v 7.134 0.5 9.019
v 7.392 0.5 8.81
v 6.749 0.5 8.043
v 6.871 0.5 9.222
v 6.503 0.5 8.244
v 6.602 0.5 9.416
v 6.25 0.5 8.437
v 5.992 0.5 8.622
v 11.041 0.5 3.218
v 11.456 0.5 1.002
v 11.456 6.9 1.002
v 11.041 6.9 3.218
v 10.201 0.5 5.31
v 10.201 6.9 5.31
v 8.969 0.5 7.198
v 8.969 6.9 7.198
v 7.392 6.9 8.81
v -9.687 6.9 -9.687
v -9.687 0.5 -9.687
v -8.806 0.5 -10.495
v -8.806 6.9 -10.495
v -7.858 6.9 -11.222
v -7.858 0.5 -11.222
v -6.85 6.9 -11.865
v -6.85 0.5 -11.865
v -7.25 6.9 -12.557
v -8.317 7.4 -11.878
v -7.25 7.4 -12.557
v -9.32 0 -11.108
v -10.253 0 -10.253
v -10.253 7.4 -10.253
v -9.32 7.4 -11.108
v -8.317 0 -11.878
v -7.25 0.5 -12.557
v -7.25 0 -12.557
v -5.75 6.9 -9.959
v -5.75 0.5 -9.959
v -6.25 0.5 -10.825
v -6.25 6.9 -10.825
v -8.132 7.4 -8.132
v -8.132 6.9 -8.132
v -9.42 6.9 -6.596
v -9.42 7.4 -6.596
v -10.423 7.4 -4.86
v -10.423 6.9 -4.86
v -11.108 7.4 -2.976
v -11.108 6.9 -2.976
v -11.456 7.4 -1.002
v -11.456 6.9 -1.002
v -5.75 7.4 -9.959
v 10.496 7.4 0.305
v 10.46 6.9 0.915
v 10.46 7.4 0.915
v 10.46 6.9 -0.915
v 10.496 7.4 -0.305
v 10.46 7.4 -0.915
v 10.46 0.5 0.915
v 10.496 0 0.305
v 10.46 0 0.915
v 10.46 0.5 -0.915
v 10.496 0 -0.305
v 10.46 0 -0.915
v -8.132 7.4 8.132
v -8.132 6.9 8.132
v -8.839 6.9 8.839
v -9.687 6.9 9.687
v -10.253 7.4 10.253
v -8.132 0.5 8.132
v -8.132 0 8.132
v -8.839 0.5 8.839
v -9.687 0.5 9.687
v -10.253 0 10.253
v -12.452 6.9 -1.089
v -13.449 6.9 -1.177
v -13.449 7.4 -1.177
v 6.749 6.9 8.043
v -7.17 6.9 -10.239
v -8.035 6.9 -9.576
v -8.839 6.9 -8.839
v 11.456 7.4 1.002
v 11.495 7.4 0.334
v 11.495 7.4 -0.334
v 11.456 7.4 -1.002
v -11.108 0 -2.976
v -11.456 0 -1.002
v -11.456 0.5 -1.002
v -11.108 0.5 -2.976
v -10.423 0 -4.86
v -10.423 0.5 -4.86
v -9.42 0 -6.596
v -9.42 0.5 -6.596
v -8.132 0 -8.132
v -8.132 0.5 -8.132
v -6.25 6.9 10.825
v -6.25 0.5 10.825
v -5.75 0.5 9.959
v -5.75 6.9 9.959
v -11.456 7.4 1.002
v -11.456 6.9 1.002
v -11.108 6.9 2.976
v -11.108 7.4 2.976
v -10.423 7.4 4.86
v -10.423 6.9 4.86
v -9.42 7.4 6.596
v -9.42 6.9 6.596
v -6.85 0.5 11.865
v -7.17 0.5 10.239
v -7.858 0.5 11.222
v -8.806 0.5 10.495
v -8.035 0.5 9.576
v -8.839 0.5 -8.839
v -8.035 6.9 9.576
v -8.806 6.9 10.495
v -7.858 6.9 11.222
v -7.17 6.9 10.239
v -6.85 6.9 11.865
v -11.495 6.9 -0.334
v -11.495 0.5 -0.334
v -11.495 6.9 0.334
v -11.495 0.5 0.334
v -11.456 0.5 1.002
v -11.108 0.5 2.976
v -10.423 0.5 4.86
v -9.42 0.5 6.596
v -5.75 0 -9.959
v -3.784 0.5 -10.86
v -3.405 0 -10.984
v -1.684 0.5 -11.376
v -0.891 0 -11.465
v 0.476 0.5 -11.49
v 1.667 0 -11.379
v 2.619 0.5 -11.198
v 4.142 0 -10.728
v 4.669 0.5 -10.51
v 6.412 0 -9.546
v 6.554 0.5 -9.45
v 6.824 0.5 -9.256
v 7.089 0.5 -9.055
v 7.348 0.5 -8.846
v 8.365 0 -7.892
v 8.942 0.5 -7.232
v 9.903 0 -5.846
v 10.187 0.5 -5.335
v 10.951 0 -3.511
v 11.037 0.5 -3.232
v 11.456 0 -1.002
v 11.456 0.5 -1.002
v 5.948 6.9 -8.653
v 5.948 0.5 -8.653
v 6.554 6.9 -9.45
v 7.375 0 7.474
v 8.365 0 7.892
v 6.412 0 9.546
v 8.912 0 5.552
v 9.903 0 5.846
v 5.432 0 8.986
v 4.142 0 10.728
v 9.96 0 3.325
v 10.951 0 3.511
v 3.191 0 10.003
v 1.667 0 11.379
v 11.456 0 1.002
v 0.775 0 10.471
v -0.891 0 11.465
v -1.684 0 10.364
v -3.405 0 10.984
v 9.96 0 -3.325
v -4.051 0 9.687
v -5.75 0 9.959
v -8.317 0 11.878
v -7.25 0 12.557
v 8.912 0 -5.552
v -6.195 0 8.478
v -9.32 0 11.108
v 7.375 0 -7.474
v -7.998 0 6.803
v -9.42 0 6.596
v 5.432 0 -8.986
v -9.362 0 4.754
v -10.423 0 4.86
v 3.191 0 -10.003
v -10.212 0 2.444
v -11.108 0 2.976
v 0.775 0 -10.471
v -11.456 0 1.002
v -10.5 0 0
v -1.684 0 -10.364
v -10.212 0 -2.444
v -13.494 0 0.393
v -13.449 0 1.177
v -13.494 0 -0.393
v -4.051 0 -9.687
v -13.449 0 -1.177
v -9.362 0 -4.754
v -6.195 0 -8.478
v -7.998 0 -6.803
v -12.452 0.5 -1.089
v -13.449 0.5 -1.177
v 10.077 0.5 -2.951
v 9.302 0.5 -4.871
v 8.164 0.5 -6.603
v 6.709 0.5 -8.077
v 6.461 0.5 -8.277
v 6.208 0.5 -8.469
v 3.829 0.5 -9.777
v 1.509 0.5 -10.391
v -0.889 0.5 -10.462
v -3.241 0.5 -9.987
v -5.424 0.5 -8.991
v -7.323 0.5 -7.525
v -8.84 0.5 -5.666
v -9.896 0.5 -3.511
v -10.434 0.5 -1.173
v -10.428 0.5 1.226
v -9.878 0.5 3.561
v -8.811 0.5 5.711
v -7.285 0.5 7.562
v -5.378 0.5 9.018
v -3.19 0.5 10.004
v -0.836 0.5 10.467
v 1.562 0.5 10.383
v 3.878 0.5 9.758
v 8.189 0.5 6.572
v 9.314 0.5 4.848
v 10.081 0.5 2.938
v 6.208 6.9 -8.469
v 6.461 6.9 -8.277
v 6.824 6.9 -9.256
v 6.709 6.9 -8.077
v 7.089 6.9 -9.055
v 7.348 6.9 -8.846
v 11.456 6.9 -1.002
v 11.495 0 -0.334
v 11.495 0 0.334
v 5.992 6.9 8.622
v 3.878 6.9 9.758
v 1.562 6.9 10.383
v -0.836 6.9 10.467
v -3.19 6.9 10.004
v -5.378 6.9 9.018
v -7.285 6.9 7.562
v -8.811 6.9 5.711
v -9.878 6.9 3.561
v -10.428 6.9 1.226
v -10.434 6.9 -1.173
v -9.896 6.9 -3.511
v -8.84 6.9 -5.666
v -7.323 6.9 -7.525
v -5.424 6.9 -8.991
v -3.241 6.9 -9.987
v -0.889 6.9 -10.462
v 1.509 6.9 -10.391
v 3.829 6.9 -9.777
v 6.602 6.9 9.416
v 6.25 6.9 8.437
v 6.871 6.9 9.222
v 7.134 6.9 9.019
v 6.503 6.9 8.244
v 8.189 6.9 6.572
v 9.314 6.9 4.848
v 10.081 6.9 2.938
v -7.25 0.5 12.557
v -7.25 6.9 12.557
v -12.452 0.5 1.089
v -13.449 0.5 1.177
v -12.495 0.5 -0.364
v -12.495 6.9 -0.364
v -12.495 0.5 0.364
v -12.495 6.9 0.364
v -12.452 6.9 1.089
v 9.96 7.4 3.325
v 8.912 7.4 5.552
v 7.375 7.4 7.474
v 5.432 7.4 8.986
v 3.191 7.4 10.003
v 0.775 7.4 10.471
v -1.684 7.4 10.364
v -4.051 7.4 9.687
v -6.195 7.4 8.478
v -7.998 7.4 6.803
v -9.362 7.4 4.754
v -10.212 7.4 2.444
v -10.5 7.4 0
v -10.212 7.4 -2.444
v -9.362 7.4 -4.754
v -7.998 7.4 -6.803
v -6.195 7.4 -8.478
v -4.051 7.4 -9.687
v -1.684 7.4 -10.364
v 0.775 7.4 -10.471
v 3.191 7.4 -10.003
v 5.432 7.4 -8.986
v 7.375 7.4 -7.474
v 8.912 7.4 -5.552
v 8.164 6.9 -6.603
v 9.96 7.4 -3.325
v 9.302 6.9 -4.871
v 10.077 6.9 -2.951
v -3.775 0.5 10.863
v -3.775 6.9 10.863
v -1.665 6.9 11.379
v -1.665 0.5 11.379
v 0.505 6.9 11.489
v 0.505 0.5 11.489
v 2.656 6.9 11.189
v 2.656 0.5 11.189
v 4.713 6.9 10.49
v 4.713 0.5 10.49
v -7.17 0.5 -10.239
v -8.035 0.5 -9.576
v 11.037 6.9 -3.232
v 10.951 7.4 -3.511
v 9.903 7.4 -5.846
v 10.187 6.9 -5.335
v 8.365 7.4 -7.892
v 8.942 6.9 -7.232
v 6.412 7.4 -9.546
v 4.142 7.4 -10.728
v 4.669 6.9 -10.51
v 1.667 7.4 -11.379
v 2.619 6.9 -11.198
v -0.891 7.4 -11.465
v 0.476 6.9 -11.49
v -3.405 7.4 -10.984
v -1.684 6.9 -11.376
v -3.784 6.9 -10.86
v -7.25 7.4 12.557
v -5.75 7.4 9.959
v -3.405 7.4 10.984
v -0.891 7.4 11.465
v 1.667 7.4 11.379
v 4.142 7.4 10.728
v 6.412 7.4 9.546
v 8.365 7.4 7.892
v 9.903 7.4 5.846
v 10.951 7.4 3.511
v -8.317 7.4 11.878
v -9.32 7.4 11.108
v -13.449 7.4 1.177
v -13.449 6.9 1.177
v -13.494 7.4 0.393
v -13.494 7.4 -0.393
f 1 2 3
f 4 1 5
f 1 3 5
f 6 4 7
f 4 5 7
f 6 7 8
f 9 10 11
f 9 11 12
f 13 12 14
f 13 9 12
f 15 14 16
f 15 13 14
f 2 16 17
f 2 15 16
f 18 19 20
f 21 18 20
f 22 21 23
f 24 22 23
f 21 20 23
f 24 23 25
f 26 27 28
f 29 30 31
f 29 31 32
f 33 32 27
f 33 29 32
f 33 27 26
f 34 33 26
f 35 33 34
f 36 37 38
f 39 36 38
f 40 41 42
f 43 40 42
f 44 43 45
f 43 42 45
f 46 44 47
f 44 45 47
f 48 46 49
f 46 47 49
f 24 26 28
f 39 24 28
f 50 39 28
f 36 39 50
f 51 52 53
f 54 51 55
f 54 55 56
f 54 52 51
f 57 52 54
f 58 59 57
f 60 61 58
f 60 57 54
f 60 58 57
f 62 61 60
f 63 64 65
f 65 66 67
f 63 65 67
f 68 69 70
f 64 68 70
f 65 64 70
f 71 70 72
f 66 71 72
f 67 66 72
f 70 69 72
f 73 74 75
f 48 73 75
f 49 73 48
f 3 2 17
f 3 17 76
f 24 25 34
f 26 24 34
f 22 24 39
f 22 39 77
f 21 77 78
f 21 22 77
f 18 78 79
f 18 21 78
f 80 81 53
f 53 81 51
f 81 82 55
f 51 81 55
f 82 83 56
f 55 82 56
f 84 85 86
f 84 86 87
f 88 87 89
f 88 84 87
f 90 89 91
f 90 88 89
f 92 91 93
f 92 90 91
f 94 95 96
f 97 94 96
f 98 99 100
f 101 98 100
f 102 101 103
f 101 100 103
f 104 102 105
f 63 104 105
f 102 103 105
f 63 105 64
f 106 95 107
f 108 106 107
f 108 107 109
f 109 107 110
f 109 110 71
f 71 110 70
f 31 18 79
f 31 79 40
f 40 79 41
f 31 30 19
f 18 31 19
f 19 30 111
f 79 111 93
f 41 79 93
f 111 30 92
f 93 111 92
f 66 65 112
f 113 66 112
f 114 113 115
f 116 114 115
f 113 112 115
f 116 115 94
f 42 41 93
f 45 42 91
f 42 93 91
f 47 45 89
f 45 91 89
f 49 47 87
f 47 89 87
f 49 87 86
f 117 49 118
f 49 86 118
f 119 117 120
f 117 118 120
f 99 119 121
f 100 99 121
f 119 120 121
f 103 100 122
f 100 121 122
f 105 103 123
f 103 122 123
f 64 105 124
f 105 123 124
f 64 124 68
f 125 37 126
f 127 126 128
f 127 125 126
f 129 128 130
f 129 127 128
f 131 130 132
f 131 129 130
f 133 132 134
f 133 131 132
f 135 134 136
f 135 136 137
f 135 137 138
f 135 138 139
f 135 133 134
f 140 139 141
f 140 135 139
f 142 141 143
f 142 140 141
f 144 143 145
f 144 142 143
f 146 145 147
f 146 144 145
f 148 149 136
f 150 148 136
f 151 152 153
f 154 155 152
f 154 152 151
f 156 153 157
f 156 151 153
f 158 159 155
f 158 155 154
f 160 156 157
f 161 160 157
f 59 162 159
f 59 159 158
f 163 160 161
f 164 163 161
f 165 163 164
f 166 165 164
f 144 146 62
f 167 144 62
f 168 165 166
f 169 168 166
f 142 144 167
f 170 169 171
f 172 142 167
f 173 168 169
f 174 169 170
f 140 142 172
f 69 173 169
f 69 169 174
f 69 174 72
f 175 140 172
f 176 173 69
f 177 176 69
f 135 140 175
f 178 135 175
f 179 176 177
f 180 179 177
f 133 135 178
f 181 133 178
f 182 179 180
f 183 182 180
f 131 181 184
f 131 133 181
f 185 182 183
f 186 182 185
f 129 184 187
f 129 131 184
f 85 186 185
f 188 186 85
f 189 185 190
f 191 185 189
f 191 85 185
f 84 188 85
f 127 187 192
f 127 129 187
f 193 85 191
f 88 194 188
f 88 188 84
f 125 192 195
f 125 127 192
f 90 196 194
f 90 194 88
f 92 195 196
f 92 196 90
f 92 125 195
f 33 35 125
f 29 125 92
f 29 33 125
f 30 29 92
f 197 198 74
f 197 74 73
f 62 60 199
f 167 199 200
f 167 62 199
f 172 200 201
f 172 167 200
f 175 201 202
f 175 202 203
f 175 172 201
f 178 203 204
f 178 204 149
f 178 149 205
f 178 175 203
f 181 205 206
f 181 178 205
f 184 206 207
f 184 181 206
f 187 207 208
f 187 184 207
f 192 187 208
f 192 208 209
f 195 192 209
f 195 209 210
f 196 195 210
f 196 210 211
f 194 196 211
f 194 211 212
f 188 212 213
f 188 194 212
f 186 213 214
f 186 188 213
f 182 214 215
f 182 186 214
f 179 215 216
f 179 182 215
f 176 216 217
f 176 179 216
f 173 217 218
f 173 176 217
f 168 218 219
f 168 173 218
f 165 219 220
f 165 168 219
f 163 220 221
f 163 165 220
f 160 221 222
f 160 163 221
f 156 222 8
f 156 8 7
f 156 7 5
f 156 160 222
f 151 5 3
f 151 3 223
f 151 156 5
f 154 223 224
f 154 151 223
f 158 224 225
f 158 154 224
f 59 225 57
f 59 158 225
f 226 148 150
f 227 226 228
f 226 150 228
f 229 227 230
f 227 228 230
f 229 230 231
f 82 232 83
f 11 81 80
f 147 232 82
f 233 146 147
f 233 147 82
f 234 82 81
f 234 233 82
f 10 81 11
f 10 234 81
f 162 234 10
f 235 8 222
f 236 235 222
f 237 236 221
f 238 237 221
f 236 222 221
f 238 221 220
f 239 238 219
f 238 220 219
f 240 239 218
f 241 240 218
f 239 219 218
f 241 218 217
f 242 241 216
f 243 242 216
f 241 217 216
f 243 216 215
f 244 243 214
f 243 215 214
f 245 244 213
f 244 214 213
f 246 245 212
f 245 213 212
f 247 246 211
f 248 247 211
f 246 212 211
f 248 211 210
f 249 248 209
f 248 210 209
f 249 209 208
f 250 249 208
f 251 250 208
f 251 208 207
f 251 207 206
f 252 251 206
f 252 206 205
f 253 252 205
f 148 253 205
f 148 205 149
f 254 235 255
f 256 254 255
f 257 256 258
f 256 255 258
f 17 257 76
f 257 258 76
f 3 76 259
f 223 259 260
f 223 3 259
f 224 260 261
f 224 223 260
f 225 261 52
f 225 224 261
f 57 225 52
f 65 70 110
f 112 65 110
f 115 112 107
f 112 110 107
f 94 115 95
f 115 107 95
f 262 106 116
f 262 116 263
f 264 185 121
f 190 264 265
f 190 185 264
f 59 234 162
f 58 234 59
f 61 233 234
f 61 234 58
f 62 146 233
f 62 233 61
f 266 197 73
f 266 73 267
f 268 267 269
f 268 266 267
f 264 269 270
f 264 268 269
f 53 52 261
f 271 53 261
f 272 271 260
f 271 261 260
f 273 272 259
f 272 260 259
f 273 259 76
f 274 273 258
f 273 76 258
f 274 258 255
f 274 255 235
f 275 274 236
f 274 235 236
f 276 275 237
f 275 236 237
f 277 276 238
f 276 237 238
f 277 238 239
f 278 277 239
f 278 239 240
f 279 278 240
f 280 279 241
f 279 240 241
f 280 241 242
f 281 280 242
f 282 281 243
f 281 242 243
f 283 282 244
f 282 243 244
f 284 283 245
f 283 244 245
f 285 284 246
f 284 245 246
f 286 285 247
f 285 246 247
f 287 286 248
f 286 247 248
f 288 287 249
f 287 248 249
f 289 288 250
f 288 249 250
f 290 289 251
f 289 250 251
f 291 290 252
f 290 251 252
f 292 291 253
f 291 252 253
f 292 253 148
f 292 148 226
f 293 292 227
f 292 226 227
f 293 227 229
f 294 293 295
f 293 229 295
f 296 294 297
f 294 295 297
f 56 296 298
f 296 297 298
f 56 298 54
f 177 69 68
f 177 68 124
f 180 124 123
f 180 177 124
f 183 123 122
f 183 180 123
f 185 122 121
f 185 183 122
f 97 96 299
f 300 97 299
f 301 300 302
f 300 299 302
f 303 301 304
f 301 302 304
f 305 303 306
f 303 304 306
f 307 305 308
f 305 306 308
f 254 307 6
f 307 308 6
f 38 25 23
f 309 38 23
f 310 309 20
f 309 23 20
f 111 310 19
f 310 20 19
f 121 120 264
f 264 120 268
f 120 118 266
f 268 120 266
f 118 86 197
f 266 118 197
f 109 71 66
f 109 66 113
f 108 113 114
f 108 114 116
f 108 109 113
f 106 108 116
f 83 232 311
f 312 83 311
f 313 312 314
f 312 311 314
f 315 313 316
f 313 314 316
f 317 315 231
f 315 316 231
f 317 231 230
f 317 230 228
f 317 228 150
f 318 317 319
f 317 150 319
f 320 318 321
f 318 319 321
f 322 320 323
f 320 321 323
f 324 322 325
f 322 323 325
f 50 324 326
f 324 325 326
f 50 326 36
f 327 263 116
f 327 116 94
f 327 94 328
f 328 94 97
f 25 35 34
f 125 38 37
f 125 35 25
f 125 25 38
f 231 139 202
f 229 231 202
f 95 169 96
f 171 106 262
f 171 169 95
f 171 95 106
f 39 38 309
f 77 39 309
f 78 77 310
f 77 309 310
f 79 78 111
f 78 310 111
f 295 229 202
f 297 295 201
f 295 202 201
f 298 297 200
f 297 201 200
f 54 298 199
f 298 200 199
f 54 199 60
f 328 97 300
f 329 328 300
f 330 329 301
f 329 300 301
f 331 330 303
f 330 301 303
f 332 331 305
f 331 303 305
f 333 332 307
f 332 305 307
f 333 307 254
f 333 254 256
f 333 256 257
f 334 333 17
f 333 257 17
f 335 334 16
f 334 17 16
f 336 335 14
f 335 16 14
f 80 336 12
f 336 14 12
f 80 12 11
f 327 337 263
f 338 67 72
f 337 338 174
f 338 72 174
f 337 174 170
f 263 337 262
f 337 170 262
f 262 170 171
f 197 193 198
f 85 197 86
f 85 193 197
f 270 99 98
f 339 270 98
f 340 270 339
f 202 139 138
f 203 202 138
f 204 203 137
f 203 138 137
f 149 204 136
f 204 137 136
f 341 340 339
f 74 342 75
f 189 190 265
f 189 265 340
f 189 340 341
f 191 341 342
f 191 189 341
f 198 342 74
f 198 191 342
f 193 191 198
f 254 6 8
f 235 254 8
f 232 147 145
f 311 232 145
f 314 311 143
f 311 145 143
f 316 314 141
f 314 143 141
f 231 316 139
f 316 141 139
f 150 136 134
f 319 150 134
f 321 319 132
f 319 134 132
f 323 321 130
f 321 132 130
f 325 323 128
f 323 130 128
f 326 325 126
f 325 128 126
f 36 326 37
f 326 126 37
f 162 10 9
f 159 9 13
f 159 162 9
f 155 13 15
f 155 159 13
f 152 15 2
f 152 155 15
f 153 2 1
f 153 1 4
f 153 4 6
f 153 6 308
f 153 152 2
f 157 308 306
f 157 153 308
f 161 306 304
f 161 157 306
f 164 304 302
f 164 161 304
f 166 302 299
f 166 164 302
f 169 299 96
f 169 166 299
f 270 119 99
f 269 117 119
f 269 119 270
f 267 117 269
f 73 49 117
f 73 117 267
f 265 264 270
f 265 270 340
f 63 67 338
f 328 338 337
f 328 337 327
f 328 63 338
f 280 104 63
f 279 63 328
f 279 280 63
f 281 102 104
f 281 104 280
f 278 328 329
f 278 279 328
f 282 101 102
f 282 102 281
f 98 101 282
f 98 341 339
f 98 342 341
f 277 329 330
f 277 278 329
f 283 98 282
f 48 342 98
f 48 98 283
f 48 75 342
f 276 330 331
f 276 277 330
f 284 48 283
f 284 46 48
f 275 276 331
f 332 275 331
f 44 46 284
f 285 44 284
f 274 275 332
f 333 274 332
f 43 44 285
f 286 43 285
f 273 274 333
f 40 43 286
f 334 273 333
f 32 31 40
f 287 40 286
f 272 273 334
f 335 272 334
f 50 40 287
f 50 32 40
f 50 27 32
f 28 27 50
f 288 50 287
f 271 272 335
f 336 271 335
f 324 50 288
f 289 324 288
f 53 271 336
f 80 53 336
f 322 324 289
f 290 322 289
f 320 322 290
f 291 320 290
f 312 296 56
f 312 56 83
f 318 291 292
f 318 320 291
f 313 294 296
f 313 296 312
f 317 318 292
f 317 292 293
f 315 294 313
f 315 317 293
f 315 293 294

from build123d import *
from build123d.topology import SkipClean

# Parameters (mm, degrees)
EXTRUDE_1_DEPTH = 0.5
EXTRUDE_2_DEPTH = 6.4
EXTRUDE_3_DEPTH = 0.5
EXTRUDE_4_DEPTH = 6.4
EXTRUDE_5_DEPTH = 0.5
EXTRUDE_START   = -7.4
EXTRUDE_6_DEPTH = 7.4


with BuildPart() as part:
    # 草图1 → 凸台-拉伸1 (new body)
    with BuildSketch(Plane(origin=(0, 0, 0), x_dir=(1, 0, 0), z_dir=(0, 1, 0))):
        with BuildLine():
            Line((11.456239028, 1.002291042), (10.46004433, 0.915135299))
            ThreePointArc((10.46004433, 0.915135299), (-10.5, 0), (10.46004433, -0.915135299))
            Line((10.46004433, -0.915135299), (11.456239028, -1.002291042))
            ThreePointArc((11.456239028, -1.002291042), (5.310109052, -10.200624582), (-5.75, -9.959292144))
            Line((-5.75, -9.959292144), (-7.25, -12.557368355))
            ThreePointArc((-7.25, -12.557368355), (-8.827040721, -11.503623434), (-10.253048327, -10.253048327))
            Line((-10.253048327, -10.253048327), (-8.131727984, -8.131727984))
            ThreePointArc((-8.131727984, -8.131727984), (-10.422539551, -4.86011001), (-11.456239028, -1.002291042))
            Line((-11.456239028, -1.002291042), (-13.448628424, -1.176602527))
            ThreePointArc((-13.448628424, -1.176602527), (-13.5, 0), (-13.448628424, 1.176602527))
            Line((-13.448628424, 1.176602527), (-11.456239028, 1.002291042))
            ThreePointArc((-11.456239028, 1.002291042), (-10.422539551, 4.86011001), (-8.131727984, 8.131727984))
            Line((-8.131727984, 8.131727984), (-10.253048327, 10.253048327))
            ThreePointArc((-10.253048327, 10.253048327), (-8.827040721, 11.503623434), (-7.25, 12.557368355))
            Line((-7.25, 12.557368355), (-5.75, 9.959292144))
            ThreePointArc((-5.75, 9.959292144), (5.310109052, 10.200624582), (11.456239028, 1.002291042))
        make_face()
    extrude(amount=EXTRUDE_1_DEPTH)

    # 草图10 → 凸台-拉伸2 (add)
    with BuildSketch(Plane(origin=(0, 0.5, 0), x_dir=(1, 0, 0), z_dir=(0, 1, 0))):
        with BuildLine():
            Line((10.46004433, -0.915135299), (11.456239028, -1.002291042))
            ThreePointArc((11.456239028, -1.002291042), (10.200624582, -5.310109052), (7.392057511, -8.809511096))
            Line((7.392057511, -8.809511096), (6.749269902, -8.043466653))
            ThreePointArc((6.749269902, -8.043466653), (9.313613748, -4.848360439), (10.46004433, -0.915135299))
        make_face()
        with BuildLine():
            Line((10.46004433, 0.915135299), (11.456239028, 1.002291042))
            ThreePointArc((11.456239028, 1.002291042), (10.187396942, 5.335442206), (7.348181349, 8.846142146))
            Line((7.348181349, 8.846142146), (6.709209057, 8.076912394))
            ThreePointArc((6.709209057, 8.076912394), (9.301536339, 4.87149071), (10.46004433, 0.915135299))
        make_face()
        with BuildLine():
            Line((6.601509895, -9.416478488), (5.991894646, -8.622482157))
            ThreePointArc((5.991894646, -8.622482157), (-10.499966218, -0.026634823), (5.94807324, 8.652769772))
            Line((5.94807324, 8.652769772), (6.553696854, 9.449817858))
            ThreePointArc((6.553696854, 9.449817858), (-11.49996307, -0.02914447), (6.601509895, -9.416478488))
        make_face()
    extrude(amount=EXTRUDE_2_DEPTH)

    # 草图11 → 凸台-拉伸3 (add)
    with BuildSketch(Plane(origin=(0, 6.9, 0), x_dir=(1, 0, 0), z_dir=(0, 1, 0))):
        with BuildLine():
            Line((10.46004433, 0.915135299), (11.456239028, 1.002291042))
            ThreePointArc((11.456239028, 1.002291042), (-11.5, 0), (11.456239028, -1.002291042))
            Line((11.456239028, -1.002291042), (10.46004433, -0.915135299))
            ThreePointArc((10.46004433, -0.915135299), (-10.5, 0), (10.46004433, 0.915135299))
        make_face()
    extrude(amount=EXTRUDE_3_DEPTH)

    # 草图12 → 凸台-拉伸4 (add)
    with BuildSketch(Plane(origin=(0, 0.5, 0), x_dir=(1, 0, 0), z_dir=(0, 1, 0))):
        with BuildLine():
            Line((-8.131727984, -8.131727984), (-8.838834765, -8.838834765))
            ThreePointArc((-8.838834765, -8.838834765), (-7.609517863, -9.916916754), (-6.25, -10.825317547))
            Line((-6.25, -10.825317547), (-5.75, -9.959292144))
            ThreePointArc((-5.75, -9.959292144), (-7.000756434, -9.123563413), (-8.131727984, -8.131727984))
        make_face()
        with BuildLine():
            Line((-10.253048327, -10.253048327), (-9.687362902, -9.687362902))
            ThreePointArc((-9.687362902, -9.687362902), (-8.340031577, -10.868940762), (-6.85, -11.864548032))
            Line((-6.85, -11.864548032), (-7.25, -12.557368355))
            ThreePointArc((-7.25, -12.557368355), (-8.827040721, -11.503623434), (-10.253048327, -10.253048327))
        make_face()
        with BuildLine():
            Line((-10.253048327, 10.253048327), (-9.687362902, 9.687362902))
            ThreePointArc((-9.687362902, 9.687362902), (-8.340031577, 10.868940762), (-6.85, 11.864548032))
            Line((-6.85, 11.864548032), (-7.25, 12.557368355))
            ThreePointArc((-7.25, 12.557368355), (-8.827040721, 11.503623434), (-10.253048327, 10.253048327))
        make_face()
        with BuildLine():
            Line((-5.75, 9.959292144), (-6.25, 10.825317547))
            ThreePointArc((-6.25, 10.825317547), (-7.609517863, 9.916916754), (-8.838834765, 8.838834765))
            Line((-8.838834765, 8.838834765), (-8.131727984, 8.131727984))
            ThreePointArc((-8.131727984, 8.131727984), (-7.000756434, 9.123563413), (-5.75, 9.959292144))
        make_face()
        with BuildLine():
            Line((-13.448628424, 1.176602527), (-12.452433726, 1.089446784))
            ThreePointArc((-12.452433726, 1.089446784), (-12.5, 0), (-12.452433726, -1.089446784))
            Line((-12.452433726, -1.089446784), (-13.448628424, -1.176602527))
            ThreePointArc((-13.448628424, -1.176602527), (-13.5, 0), (-13.448628424, 1.176602527))
        make_face()
    extrude(amount=EXTRUDE_4_DEPTH)

    # 草图13 → 凸台-拉伸5 (add)
    with BuildSketch(Plane(origin=(0, 6.9, 0), x_dir=(1, 0, 0), z_dir=(0, 1, 0))):
        with BuildLine():
            Line((-8.131727984, -8.131727984), (-10.253048327, -10.253048327))
            ThreePointArc((-10.253048327, -10.253048327), (-8.827040721, -11.503623434), (-7.25, -12.557368355))
            Line((-7.25, -12.557368355), (-5.75, -9.959292144))
            ThreePointArc((-5.75, -9.959292144), (-7.000756434, -9.123563413), (-8.131727984, -8.131727984))
        make_face()
        with BuildLine():
            Line((-7.25, 12.557368355), (-5.75, 9.959292144))
            ThreePointArc((-5.75, 9.959292144), (-7.000756434, 9.123563413), (-8.131727984, 8.131727984))
            Line((-8.131727984, 8.131727984), (-10.253048327, 10.253048327))
            ThreePointArc((-10.253048327, 10.253048327), (-8.827040721, 11.503623434), (-7.25, 12.557368355))
        make_face()
        with BuildLine():
            Line((-13.448628424, 1.176602527), (-11.456239028, 1.002291042))
            ThreePointArc((-11.456239028, 1.002291042), (-11.5, 0), (-11.456239028, -1.002291042))
            Line((-11.456239028, -1.002291042), (-13.448628424, -1.176602527))
            ThreePointArc((-13.448628424, -1.176602527), (-13.5, 0), (-13.448628424, 1.176602527))
        make_face()
    extrude(amount=EXTRUDE_5_DEPTH)

    # 草图14 → 凸台-拉伸6 (add)
    with SkipClean():  # the faces are left unmerged after this step: merging them gives an invalid solid
        with BuildSketch(Plane(origin=(0, 7.4, 0), x_dir=(1, 0, 0), z_dir=(0, 1, 0)).offset(EXTRUDE_START)):
            with BuildLine():
                Line((10.46004433, 0.915135299), (11.456239028, 1.002291042))
                ThreePointArc((11.456239028, 1.002291042), (11.5, 0), (11.456239028, -1.002291042))
                Line((11.456239028, -1.002291042), (10.46004433, -0.915135299))
                ThreePointArc((10.46004433, -0.915135299), (10.5, 0), (10.46004433, 0.915135299))
            make_face()
        extrude(amount=EXTRUDE_6_DEPTH)


solid = part.part
